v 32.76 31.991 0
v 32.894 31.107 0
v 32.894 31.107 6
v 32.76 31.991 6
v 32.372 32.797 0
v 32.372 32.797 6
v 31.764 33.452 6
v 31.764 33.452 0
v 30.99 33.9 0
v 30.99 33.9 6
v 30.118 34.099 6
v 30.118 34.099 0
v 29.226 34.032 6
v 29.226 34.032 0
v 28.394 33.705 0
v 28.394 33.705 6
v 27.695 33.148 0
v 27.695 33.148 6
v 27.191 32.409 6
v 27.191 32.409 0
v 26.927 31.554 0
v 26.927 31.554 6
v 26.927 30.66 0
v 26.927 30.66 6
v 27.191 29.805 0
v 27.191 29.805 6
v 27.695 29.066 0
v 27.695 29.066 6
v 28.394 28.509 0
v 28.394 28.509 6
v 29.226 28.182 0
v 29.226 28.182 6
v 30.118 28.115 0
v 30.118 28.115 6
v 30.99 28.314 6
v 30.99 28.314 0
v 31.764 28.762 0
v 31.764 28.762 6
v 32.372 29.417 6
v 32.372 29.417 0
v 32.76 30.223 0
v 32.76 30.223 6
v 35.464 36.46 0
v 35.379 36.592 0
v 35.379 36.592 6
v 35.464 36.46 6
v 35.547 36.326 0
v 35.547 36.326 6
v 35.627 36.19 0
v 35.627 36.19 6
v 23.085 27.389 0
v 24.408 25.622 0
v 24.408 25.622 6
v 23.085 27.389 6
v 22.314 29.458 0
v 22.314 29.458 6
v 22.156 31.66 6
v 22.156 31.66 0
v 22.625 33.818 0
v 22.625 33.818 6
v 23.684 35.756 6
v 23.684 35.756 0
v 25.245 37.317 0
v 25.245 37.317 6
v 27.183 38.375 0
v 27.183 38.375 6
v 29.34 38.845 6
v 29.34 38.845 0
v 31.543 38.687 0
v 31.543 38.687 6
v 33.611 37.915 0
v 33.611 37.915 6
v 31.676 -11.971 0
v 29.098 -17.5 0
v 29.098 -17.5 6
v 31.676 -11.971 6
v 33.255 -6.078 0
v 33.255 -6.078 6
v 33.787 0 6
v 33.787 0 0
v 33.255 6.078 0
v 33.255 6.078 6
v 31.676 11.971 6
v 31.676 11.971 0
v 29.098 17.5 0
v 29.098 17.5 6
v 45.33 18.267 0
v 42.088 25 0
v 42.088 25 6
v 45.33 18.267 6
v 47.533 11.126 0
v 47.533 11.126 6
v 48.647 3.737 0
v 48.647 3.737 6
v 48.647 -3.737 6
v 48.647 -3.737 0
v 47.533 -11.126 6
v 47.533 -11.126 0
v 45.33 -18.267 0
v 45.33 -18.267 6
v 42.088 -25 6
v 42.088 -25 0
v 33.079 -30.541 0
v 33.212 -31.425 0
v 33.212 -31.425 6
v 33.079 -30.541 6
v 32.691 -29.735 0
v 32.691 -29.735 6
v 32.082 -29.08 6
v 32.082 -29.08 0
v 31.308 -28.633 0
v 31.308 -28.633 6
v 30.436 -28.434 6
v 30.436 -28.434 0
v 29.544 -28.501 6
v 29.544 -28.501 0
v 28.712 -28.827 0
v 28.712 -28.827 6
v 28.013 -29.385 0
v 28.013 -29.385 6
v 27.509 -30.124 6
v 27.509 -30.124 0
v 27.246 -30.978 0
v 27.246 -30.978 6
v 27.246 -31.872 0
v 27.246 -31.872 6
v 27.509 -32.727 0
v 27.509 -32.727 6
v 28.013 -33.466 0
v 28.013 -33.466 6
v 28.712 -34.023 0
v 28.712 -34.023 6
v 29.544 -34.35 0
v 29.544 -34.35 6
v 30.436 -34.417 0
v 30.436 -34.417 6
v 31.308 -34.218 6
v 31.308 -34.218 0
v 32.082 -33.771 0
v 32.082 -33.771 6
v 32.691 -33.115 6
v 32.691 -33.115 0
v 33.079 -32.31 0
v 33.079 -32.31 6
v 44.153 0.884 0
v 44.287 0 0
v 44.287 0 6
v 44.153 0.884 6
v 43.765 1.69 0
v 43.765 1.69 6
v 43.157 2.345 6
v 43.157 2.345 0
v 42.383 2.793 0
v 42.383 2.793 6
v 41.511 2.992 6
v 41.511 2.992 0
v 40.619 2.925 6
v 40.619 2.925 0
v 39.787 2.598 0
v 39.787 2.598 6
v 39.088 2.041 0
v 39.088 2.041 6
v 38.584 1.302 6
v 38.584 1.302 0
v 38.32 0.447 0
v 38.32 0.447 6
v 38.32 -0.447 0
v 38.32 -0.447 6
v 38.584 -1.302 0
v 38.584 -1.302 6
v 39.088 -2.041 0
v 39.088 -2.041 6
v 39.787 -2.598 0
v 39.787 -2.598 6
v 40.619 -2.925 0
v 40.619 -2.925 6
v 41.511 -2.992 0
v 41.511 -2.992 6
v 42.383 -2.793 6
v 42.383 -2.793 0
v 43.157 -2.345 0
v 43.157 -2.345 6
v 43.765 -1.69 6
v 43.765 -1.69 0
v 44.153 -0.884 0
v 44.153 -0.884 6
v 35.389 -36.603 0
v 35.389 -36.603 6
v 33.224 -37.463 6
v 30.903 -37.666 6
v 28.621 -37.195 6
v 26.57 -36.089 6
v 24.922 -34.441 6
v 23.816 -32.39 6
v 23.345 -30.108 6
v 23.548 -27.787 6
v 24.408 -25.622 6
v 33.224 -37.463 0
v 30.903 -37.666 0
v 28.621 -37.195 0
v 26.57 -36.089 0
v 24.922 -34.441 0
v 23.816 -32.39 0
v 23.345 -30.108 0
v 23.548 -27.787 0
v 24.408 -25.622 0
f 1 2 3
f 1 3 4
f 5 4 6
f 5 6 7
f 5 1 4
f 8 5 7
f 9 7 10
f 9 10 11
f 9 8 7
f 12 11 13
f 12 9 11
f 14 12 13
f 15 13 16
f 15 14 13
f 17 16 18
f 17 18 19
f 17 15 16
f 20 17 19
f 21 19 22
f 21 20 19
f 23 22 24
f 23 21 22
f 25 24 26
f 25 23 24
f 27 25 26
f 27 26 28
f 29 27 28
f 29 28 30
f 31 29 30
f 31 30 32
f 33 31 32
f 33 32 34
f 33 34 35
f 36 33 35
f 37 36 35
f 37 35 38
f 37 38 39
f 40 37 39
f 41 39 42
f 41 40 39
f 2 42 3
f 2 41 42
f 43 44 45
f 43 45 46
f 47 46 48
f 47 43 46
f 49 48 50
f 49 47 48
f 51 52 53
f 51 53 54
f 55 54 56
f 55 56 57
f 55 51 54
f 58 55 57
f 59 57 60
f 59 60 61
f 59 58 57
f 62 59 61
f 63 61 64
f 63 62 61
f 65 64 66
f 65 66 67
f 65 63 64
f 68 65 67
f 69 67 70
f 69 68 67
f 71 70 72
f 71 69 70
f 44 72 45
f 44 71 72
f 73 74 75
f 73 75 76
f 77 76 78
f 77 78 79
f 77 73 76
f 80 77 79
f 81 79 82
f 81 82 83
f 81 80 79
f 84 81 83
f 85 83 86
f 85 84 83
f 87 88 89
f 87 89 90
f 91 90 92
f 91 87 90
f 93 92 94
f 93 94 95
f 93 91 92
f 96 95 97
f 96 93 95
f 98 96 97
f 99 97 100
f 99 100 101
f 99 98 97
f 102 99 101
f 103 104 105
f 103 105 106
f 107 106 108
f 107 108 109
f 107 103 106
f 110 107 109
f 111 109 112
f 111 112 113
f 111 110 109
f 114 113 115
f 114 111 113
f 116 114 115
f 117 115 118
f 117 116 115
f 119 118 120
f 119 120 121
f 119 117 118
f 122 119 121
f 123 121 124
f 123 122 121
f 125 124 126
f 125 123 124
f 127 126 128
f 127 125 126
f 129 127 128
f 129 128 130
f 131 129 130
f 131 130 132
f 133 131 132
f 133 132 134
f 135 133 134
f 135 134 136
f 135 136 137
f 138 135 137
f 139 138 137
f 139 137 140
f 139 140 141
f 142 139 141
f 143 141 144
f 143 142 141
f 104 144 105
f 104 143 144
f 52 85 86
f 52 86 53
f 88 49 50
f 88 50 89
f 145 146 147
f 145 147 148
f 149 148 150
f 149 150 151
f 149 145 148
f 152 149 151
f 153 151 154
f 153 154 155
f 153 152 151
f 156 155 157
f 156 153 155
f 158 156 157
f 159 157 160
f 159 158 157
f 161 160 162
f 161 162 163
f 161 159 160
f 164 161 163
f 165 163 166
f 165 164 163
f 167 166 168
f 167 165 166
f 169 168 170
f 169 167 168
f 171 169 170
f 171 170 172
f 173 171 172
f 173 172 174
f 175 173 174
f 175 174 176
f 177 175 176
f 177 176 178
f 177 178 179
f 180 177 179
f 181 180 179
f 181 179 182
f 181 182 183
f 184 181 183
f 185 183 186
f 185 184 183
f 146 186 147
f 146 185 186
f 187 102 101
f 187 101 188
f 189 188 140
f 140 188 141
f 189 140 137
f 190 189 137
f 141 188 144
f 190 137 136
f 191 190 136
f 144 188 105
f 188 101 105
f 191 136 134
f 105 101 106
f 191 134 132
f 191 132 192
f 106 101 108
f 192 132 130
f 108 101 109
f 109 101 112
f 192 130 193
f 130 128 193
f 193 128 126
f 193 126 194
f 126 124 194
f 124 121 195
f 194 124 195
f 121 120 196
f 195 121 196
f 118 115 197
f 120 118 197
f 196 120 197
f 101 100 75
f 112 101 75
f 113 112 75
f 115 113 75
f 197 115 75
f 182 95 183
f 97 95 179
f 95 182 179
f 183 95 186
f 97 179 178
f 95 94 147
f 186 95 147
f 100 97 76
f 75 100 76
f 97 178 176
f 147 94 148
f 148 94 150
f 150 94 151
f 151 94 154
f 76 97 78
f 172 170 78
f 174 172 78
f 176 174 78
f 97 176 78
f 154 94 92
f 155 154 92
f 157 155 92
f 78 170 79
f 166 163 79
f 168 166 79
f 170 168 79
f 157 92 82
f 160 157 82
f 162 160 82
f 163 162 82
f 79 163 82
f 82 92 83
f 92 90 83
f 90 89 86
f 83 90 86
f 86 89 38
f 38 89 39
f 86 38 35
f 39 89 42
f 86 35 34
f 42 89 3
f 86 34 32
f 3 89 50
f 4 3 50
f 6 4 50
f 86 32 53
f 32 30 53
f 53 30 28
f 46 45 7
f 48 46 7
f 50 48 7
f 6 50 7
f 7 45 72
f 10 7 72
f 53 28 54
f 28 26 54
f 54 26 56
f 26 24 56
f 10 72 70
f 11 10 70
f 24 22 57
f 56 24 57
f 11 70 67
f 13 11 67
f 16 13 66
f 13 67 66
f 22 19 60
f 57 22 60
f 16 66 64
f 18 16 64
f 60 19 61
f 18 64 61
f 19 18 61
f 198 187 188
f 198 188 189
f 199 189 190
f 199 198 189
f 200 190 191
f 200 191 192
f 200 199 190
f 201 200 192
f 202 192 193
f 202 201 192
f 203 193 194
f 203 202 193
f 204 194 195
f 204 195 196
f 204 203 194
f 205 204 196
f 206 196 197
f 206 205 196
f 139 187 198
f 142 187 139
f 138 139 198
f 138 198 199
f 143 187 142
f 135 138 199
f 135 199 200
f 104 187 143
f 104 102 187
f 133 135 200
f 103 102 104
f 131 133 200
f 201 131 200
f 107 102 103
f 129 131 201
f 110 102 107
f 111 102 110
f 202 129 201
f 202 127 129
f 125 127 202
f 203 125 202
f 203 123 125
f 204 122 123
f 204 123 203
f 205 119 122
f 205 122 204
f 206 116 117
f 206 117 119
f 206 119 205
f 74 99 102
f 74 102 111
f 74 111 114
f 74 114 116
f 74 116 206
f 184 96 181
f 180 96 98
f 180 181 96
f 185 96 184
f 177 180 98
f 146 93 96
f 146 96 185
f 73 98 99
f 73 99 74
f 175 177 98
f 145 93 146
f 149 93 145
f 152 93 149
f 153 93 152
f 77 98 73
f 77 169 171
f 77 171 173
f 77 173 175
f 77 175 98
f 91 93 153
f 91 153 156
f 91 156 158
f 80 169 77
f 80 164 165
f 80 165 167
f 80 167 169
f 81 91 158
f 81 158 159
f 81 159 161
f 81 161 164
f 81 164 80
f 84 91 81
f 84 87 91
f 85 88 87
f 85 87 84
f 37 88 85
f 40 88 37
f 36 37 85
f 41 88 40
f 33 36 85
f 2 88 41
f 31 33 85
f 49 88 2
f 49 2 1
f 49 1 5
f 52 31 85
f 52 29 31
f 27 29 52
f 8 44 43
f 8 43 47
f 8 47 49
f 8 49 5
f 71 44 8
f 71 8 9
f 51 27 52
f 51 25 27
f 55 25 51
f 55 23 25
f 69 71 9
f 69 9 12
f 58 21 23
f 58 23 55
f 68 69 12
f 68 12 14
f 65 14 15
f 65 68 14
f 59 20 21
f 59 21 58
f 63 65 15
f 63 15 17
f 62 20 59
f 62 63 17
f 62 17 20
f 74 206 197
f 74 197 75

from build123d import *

# Parameters (mm, degrees)
SKETCH1_R           = 3
BOSS_EXTRUDE1_DEPTH = 6


with BuildPart() as part:
    # Sketch1 → Boss-Extrude1 (new body)
    with BuildSketch(Plane.XY):
        with BuildLine():
            Line((29.097558797, 17.5), (24.40844793, 25.621778265))
            ThreePointArc((24.40844793, 25.621778265), (24.40844793, 36.592231664), (35.378901329, 36.592231664))
            ThreePointArc((35.378901329, 36.592231664), (35.506003821, 36.393205072), (35.627115001, 36.190476904))
            Line((35.627115001, 36.190476904), (42.087939854, 25))
            ThreePointArc((42.087939854, 25), (48.786669665, 0), (42.087939854, -25))
            Line((42.087939854, -25), (35.389210043, -36.602540378))
            ThreePointArc((35.389210043, -36.602540378), (25.685911427, -35.325076881), (24.40844793, -25.621778265))
            Line((24.40844793, -25.621778265), (29.097558797, -17.5))
            ThreePointArc((29.097558797, -17.5), (33.786669665, 0), (29.097558797, 17.5))
        make_face()
        with Locations((41.286669665, 0)):
            Circle(SKETCH1_R, mode=Mode.SUBTRACT)
        with Locations((30.212002479, -31.425332814)):
            Circle(SKETCH1_R, mode=Mode.SUBTRACT)
        with Locations((29.893674629, 31.107004965)):
            Circle(SKETCH1_R, mode=Mode.SUBTRACT)
    extrude(amount=BOSS_EXTRUDE1_DEPTH)


solid = part.part
